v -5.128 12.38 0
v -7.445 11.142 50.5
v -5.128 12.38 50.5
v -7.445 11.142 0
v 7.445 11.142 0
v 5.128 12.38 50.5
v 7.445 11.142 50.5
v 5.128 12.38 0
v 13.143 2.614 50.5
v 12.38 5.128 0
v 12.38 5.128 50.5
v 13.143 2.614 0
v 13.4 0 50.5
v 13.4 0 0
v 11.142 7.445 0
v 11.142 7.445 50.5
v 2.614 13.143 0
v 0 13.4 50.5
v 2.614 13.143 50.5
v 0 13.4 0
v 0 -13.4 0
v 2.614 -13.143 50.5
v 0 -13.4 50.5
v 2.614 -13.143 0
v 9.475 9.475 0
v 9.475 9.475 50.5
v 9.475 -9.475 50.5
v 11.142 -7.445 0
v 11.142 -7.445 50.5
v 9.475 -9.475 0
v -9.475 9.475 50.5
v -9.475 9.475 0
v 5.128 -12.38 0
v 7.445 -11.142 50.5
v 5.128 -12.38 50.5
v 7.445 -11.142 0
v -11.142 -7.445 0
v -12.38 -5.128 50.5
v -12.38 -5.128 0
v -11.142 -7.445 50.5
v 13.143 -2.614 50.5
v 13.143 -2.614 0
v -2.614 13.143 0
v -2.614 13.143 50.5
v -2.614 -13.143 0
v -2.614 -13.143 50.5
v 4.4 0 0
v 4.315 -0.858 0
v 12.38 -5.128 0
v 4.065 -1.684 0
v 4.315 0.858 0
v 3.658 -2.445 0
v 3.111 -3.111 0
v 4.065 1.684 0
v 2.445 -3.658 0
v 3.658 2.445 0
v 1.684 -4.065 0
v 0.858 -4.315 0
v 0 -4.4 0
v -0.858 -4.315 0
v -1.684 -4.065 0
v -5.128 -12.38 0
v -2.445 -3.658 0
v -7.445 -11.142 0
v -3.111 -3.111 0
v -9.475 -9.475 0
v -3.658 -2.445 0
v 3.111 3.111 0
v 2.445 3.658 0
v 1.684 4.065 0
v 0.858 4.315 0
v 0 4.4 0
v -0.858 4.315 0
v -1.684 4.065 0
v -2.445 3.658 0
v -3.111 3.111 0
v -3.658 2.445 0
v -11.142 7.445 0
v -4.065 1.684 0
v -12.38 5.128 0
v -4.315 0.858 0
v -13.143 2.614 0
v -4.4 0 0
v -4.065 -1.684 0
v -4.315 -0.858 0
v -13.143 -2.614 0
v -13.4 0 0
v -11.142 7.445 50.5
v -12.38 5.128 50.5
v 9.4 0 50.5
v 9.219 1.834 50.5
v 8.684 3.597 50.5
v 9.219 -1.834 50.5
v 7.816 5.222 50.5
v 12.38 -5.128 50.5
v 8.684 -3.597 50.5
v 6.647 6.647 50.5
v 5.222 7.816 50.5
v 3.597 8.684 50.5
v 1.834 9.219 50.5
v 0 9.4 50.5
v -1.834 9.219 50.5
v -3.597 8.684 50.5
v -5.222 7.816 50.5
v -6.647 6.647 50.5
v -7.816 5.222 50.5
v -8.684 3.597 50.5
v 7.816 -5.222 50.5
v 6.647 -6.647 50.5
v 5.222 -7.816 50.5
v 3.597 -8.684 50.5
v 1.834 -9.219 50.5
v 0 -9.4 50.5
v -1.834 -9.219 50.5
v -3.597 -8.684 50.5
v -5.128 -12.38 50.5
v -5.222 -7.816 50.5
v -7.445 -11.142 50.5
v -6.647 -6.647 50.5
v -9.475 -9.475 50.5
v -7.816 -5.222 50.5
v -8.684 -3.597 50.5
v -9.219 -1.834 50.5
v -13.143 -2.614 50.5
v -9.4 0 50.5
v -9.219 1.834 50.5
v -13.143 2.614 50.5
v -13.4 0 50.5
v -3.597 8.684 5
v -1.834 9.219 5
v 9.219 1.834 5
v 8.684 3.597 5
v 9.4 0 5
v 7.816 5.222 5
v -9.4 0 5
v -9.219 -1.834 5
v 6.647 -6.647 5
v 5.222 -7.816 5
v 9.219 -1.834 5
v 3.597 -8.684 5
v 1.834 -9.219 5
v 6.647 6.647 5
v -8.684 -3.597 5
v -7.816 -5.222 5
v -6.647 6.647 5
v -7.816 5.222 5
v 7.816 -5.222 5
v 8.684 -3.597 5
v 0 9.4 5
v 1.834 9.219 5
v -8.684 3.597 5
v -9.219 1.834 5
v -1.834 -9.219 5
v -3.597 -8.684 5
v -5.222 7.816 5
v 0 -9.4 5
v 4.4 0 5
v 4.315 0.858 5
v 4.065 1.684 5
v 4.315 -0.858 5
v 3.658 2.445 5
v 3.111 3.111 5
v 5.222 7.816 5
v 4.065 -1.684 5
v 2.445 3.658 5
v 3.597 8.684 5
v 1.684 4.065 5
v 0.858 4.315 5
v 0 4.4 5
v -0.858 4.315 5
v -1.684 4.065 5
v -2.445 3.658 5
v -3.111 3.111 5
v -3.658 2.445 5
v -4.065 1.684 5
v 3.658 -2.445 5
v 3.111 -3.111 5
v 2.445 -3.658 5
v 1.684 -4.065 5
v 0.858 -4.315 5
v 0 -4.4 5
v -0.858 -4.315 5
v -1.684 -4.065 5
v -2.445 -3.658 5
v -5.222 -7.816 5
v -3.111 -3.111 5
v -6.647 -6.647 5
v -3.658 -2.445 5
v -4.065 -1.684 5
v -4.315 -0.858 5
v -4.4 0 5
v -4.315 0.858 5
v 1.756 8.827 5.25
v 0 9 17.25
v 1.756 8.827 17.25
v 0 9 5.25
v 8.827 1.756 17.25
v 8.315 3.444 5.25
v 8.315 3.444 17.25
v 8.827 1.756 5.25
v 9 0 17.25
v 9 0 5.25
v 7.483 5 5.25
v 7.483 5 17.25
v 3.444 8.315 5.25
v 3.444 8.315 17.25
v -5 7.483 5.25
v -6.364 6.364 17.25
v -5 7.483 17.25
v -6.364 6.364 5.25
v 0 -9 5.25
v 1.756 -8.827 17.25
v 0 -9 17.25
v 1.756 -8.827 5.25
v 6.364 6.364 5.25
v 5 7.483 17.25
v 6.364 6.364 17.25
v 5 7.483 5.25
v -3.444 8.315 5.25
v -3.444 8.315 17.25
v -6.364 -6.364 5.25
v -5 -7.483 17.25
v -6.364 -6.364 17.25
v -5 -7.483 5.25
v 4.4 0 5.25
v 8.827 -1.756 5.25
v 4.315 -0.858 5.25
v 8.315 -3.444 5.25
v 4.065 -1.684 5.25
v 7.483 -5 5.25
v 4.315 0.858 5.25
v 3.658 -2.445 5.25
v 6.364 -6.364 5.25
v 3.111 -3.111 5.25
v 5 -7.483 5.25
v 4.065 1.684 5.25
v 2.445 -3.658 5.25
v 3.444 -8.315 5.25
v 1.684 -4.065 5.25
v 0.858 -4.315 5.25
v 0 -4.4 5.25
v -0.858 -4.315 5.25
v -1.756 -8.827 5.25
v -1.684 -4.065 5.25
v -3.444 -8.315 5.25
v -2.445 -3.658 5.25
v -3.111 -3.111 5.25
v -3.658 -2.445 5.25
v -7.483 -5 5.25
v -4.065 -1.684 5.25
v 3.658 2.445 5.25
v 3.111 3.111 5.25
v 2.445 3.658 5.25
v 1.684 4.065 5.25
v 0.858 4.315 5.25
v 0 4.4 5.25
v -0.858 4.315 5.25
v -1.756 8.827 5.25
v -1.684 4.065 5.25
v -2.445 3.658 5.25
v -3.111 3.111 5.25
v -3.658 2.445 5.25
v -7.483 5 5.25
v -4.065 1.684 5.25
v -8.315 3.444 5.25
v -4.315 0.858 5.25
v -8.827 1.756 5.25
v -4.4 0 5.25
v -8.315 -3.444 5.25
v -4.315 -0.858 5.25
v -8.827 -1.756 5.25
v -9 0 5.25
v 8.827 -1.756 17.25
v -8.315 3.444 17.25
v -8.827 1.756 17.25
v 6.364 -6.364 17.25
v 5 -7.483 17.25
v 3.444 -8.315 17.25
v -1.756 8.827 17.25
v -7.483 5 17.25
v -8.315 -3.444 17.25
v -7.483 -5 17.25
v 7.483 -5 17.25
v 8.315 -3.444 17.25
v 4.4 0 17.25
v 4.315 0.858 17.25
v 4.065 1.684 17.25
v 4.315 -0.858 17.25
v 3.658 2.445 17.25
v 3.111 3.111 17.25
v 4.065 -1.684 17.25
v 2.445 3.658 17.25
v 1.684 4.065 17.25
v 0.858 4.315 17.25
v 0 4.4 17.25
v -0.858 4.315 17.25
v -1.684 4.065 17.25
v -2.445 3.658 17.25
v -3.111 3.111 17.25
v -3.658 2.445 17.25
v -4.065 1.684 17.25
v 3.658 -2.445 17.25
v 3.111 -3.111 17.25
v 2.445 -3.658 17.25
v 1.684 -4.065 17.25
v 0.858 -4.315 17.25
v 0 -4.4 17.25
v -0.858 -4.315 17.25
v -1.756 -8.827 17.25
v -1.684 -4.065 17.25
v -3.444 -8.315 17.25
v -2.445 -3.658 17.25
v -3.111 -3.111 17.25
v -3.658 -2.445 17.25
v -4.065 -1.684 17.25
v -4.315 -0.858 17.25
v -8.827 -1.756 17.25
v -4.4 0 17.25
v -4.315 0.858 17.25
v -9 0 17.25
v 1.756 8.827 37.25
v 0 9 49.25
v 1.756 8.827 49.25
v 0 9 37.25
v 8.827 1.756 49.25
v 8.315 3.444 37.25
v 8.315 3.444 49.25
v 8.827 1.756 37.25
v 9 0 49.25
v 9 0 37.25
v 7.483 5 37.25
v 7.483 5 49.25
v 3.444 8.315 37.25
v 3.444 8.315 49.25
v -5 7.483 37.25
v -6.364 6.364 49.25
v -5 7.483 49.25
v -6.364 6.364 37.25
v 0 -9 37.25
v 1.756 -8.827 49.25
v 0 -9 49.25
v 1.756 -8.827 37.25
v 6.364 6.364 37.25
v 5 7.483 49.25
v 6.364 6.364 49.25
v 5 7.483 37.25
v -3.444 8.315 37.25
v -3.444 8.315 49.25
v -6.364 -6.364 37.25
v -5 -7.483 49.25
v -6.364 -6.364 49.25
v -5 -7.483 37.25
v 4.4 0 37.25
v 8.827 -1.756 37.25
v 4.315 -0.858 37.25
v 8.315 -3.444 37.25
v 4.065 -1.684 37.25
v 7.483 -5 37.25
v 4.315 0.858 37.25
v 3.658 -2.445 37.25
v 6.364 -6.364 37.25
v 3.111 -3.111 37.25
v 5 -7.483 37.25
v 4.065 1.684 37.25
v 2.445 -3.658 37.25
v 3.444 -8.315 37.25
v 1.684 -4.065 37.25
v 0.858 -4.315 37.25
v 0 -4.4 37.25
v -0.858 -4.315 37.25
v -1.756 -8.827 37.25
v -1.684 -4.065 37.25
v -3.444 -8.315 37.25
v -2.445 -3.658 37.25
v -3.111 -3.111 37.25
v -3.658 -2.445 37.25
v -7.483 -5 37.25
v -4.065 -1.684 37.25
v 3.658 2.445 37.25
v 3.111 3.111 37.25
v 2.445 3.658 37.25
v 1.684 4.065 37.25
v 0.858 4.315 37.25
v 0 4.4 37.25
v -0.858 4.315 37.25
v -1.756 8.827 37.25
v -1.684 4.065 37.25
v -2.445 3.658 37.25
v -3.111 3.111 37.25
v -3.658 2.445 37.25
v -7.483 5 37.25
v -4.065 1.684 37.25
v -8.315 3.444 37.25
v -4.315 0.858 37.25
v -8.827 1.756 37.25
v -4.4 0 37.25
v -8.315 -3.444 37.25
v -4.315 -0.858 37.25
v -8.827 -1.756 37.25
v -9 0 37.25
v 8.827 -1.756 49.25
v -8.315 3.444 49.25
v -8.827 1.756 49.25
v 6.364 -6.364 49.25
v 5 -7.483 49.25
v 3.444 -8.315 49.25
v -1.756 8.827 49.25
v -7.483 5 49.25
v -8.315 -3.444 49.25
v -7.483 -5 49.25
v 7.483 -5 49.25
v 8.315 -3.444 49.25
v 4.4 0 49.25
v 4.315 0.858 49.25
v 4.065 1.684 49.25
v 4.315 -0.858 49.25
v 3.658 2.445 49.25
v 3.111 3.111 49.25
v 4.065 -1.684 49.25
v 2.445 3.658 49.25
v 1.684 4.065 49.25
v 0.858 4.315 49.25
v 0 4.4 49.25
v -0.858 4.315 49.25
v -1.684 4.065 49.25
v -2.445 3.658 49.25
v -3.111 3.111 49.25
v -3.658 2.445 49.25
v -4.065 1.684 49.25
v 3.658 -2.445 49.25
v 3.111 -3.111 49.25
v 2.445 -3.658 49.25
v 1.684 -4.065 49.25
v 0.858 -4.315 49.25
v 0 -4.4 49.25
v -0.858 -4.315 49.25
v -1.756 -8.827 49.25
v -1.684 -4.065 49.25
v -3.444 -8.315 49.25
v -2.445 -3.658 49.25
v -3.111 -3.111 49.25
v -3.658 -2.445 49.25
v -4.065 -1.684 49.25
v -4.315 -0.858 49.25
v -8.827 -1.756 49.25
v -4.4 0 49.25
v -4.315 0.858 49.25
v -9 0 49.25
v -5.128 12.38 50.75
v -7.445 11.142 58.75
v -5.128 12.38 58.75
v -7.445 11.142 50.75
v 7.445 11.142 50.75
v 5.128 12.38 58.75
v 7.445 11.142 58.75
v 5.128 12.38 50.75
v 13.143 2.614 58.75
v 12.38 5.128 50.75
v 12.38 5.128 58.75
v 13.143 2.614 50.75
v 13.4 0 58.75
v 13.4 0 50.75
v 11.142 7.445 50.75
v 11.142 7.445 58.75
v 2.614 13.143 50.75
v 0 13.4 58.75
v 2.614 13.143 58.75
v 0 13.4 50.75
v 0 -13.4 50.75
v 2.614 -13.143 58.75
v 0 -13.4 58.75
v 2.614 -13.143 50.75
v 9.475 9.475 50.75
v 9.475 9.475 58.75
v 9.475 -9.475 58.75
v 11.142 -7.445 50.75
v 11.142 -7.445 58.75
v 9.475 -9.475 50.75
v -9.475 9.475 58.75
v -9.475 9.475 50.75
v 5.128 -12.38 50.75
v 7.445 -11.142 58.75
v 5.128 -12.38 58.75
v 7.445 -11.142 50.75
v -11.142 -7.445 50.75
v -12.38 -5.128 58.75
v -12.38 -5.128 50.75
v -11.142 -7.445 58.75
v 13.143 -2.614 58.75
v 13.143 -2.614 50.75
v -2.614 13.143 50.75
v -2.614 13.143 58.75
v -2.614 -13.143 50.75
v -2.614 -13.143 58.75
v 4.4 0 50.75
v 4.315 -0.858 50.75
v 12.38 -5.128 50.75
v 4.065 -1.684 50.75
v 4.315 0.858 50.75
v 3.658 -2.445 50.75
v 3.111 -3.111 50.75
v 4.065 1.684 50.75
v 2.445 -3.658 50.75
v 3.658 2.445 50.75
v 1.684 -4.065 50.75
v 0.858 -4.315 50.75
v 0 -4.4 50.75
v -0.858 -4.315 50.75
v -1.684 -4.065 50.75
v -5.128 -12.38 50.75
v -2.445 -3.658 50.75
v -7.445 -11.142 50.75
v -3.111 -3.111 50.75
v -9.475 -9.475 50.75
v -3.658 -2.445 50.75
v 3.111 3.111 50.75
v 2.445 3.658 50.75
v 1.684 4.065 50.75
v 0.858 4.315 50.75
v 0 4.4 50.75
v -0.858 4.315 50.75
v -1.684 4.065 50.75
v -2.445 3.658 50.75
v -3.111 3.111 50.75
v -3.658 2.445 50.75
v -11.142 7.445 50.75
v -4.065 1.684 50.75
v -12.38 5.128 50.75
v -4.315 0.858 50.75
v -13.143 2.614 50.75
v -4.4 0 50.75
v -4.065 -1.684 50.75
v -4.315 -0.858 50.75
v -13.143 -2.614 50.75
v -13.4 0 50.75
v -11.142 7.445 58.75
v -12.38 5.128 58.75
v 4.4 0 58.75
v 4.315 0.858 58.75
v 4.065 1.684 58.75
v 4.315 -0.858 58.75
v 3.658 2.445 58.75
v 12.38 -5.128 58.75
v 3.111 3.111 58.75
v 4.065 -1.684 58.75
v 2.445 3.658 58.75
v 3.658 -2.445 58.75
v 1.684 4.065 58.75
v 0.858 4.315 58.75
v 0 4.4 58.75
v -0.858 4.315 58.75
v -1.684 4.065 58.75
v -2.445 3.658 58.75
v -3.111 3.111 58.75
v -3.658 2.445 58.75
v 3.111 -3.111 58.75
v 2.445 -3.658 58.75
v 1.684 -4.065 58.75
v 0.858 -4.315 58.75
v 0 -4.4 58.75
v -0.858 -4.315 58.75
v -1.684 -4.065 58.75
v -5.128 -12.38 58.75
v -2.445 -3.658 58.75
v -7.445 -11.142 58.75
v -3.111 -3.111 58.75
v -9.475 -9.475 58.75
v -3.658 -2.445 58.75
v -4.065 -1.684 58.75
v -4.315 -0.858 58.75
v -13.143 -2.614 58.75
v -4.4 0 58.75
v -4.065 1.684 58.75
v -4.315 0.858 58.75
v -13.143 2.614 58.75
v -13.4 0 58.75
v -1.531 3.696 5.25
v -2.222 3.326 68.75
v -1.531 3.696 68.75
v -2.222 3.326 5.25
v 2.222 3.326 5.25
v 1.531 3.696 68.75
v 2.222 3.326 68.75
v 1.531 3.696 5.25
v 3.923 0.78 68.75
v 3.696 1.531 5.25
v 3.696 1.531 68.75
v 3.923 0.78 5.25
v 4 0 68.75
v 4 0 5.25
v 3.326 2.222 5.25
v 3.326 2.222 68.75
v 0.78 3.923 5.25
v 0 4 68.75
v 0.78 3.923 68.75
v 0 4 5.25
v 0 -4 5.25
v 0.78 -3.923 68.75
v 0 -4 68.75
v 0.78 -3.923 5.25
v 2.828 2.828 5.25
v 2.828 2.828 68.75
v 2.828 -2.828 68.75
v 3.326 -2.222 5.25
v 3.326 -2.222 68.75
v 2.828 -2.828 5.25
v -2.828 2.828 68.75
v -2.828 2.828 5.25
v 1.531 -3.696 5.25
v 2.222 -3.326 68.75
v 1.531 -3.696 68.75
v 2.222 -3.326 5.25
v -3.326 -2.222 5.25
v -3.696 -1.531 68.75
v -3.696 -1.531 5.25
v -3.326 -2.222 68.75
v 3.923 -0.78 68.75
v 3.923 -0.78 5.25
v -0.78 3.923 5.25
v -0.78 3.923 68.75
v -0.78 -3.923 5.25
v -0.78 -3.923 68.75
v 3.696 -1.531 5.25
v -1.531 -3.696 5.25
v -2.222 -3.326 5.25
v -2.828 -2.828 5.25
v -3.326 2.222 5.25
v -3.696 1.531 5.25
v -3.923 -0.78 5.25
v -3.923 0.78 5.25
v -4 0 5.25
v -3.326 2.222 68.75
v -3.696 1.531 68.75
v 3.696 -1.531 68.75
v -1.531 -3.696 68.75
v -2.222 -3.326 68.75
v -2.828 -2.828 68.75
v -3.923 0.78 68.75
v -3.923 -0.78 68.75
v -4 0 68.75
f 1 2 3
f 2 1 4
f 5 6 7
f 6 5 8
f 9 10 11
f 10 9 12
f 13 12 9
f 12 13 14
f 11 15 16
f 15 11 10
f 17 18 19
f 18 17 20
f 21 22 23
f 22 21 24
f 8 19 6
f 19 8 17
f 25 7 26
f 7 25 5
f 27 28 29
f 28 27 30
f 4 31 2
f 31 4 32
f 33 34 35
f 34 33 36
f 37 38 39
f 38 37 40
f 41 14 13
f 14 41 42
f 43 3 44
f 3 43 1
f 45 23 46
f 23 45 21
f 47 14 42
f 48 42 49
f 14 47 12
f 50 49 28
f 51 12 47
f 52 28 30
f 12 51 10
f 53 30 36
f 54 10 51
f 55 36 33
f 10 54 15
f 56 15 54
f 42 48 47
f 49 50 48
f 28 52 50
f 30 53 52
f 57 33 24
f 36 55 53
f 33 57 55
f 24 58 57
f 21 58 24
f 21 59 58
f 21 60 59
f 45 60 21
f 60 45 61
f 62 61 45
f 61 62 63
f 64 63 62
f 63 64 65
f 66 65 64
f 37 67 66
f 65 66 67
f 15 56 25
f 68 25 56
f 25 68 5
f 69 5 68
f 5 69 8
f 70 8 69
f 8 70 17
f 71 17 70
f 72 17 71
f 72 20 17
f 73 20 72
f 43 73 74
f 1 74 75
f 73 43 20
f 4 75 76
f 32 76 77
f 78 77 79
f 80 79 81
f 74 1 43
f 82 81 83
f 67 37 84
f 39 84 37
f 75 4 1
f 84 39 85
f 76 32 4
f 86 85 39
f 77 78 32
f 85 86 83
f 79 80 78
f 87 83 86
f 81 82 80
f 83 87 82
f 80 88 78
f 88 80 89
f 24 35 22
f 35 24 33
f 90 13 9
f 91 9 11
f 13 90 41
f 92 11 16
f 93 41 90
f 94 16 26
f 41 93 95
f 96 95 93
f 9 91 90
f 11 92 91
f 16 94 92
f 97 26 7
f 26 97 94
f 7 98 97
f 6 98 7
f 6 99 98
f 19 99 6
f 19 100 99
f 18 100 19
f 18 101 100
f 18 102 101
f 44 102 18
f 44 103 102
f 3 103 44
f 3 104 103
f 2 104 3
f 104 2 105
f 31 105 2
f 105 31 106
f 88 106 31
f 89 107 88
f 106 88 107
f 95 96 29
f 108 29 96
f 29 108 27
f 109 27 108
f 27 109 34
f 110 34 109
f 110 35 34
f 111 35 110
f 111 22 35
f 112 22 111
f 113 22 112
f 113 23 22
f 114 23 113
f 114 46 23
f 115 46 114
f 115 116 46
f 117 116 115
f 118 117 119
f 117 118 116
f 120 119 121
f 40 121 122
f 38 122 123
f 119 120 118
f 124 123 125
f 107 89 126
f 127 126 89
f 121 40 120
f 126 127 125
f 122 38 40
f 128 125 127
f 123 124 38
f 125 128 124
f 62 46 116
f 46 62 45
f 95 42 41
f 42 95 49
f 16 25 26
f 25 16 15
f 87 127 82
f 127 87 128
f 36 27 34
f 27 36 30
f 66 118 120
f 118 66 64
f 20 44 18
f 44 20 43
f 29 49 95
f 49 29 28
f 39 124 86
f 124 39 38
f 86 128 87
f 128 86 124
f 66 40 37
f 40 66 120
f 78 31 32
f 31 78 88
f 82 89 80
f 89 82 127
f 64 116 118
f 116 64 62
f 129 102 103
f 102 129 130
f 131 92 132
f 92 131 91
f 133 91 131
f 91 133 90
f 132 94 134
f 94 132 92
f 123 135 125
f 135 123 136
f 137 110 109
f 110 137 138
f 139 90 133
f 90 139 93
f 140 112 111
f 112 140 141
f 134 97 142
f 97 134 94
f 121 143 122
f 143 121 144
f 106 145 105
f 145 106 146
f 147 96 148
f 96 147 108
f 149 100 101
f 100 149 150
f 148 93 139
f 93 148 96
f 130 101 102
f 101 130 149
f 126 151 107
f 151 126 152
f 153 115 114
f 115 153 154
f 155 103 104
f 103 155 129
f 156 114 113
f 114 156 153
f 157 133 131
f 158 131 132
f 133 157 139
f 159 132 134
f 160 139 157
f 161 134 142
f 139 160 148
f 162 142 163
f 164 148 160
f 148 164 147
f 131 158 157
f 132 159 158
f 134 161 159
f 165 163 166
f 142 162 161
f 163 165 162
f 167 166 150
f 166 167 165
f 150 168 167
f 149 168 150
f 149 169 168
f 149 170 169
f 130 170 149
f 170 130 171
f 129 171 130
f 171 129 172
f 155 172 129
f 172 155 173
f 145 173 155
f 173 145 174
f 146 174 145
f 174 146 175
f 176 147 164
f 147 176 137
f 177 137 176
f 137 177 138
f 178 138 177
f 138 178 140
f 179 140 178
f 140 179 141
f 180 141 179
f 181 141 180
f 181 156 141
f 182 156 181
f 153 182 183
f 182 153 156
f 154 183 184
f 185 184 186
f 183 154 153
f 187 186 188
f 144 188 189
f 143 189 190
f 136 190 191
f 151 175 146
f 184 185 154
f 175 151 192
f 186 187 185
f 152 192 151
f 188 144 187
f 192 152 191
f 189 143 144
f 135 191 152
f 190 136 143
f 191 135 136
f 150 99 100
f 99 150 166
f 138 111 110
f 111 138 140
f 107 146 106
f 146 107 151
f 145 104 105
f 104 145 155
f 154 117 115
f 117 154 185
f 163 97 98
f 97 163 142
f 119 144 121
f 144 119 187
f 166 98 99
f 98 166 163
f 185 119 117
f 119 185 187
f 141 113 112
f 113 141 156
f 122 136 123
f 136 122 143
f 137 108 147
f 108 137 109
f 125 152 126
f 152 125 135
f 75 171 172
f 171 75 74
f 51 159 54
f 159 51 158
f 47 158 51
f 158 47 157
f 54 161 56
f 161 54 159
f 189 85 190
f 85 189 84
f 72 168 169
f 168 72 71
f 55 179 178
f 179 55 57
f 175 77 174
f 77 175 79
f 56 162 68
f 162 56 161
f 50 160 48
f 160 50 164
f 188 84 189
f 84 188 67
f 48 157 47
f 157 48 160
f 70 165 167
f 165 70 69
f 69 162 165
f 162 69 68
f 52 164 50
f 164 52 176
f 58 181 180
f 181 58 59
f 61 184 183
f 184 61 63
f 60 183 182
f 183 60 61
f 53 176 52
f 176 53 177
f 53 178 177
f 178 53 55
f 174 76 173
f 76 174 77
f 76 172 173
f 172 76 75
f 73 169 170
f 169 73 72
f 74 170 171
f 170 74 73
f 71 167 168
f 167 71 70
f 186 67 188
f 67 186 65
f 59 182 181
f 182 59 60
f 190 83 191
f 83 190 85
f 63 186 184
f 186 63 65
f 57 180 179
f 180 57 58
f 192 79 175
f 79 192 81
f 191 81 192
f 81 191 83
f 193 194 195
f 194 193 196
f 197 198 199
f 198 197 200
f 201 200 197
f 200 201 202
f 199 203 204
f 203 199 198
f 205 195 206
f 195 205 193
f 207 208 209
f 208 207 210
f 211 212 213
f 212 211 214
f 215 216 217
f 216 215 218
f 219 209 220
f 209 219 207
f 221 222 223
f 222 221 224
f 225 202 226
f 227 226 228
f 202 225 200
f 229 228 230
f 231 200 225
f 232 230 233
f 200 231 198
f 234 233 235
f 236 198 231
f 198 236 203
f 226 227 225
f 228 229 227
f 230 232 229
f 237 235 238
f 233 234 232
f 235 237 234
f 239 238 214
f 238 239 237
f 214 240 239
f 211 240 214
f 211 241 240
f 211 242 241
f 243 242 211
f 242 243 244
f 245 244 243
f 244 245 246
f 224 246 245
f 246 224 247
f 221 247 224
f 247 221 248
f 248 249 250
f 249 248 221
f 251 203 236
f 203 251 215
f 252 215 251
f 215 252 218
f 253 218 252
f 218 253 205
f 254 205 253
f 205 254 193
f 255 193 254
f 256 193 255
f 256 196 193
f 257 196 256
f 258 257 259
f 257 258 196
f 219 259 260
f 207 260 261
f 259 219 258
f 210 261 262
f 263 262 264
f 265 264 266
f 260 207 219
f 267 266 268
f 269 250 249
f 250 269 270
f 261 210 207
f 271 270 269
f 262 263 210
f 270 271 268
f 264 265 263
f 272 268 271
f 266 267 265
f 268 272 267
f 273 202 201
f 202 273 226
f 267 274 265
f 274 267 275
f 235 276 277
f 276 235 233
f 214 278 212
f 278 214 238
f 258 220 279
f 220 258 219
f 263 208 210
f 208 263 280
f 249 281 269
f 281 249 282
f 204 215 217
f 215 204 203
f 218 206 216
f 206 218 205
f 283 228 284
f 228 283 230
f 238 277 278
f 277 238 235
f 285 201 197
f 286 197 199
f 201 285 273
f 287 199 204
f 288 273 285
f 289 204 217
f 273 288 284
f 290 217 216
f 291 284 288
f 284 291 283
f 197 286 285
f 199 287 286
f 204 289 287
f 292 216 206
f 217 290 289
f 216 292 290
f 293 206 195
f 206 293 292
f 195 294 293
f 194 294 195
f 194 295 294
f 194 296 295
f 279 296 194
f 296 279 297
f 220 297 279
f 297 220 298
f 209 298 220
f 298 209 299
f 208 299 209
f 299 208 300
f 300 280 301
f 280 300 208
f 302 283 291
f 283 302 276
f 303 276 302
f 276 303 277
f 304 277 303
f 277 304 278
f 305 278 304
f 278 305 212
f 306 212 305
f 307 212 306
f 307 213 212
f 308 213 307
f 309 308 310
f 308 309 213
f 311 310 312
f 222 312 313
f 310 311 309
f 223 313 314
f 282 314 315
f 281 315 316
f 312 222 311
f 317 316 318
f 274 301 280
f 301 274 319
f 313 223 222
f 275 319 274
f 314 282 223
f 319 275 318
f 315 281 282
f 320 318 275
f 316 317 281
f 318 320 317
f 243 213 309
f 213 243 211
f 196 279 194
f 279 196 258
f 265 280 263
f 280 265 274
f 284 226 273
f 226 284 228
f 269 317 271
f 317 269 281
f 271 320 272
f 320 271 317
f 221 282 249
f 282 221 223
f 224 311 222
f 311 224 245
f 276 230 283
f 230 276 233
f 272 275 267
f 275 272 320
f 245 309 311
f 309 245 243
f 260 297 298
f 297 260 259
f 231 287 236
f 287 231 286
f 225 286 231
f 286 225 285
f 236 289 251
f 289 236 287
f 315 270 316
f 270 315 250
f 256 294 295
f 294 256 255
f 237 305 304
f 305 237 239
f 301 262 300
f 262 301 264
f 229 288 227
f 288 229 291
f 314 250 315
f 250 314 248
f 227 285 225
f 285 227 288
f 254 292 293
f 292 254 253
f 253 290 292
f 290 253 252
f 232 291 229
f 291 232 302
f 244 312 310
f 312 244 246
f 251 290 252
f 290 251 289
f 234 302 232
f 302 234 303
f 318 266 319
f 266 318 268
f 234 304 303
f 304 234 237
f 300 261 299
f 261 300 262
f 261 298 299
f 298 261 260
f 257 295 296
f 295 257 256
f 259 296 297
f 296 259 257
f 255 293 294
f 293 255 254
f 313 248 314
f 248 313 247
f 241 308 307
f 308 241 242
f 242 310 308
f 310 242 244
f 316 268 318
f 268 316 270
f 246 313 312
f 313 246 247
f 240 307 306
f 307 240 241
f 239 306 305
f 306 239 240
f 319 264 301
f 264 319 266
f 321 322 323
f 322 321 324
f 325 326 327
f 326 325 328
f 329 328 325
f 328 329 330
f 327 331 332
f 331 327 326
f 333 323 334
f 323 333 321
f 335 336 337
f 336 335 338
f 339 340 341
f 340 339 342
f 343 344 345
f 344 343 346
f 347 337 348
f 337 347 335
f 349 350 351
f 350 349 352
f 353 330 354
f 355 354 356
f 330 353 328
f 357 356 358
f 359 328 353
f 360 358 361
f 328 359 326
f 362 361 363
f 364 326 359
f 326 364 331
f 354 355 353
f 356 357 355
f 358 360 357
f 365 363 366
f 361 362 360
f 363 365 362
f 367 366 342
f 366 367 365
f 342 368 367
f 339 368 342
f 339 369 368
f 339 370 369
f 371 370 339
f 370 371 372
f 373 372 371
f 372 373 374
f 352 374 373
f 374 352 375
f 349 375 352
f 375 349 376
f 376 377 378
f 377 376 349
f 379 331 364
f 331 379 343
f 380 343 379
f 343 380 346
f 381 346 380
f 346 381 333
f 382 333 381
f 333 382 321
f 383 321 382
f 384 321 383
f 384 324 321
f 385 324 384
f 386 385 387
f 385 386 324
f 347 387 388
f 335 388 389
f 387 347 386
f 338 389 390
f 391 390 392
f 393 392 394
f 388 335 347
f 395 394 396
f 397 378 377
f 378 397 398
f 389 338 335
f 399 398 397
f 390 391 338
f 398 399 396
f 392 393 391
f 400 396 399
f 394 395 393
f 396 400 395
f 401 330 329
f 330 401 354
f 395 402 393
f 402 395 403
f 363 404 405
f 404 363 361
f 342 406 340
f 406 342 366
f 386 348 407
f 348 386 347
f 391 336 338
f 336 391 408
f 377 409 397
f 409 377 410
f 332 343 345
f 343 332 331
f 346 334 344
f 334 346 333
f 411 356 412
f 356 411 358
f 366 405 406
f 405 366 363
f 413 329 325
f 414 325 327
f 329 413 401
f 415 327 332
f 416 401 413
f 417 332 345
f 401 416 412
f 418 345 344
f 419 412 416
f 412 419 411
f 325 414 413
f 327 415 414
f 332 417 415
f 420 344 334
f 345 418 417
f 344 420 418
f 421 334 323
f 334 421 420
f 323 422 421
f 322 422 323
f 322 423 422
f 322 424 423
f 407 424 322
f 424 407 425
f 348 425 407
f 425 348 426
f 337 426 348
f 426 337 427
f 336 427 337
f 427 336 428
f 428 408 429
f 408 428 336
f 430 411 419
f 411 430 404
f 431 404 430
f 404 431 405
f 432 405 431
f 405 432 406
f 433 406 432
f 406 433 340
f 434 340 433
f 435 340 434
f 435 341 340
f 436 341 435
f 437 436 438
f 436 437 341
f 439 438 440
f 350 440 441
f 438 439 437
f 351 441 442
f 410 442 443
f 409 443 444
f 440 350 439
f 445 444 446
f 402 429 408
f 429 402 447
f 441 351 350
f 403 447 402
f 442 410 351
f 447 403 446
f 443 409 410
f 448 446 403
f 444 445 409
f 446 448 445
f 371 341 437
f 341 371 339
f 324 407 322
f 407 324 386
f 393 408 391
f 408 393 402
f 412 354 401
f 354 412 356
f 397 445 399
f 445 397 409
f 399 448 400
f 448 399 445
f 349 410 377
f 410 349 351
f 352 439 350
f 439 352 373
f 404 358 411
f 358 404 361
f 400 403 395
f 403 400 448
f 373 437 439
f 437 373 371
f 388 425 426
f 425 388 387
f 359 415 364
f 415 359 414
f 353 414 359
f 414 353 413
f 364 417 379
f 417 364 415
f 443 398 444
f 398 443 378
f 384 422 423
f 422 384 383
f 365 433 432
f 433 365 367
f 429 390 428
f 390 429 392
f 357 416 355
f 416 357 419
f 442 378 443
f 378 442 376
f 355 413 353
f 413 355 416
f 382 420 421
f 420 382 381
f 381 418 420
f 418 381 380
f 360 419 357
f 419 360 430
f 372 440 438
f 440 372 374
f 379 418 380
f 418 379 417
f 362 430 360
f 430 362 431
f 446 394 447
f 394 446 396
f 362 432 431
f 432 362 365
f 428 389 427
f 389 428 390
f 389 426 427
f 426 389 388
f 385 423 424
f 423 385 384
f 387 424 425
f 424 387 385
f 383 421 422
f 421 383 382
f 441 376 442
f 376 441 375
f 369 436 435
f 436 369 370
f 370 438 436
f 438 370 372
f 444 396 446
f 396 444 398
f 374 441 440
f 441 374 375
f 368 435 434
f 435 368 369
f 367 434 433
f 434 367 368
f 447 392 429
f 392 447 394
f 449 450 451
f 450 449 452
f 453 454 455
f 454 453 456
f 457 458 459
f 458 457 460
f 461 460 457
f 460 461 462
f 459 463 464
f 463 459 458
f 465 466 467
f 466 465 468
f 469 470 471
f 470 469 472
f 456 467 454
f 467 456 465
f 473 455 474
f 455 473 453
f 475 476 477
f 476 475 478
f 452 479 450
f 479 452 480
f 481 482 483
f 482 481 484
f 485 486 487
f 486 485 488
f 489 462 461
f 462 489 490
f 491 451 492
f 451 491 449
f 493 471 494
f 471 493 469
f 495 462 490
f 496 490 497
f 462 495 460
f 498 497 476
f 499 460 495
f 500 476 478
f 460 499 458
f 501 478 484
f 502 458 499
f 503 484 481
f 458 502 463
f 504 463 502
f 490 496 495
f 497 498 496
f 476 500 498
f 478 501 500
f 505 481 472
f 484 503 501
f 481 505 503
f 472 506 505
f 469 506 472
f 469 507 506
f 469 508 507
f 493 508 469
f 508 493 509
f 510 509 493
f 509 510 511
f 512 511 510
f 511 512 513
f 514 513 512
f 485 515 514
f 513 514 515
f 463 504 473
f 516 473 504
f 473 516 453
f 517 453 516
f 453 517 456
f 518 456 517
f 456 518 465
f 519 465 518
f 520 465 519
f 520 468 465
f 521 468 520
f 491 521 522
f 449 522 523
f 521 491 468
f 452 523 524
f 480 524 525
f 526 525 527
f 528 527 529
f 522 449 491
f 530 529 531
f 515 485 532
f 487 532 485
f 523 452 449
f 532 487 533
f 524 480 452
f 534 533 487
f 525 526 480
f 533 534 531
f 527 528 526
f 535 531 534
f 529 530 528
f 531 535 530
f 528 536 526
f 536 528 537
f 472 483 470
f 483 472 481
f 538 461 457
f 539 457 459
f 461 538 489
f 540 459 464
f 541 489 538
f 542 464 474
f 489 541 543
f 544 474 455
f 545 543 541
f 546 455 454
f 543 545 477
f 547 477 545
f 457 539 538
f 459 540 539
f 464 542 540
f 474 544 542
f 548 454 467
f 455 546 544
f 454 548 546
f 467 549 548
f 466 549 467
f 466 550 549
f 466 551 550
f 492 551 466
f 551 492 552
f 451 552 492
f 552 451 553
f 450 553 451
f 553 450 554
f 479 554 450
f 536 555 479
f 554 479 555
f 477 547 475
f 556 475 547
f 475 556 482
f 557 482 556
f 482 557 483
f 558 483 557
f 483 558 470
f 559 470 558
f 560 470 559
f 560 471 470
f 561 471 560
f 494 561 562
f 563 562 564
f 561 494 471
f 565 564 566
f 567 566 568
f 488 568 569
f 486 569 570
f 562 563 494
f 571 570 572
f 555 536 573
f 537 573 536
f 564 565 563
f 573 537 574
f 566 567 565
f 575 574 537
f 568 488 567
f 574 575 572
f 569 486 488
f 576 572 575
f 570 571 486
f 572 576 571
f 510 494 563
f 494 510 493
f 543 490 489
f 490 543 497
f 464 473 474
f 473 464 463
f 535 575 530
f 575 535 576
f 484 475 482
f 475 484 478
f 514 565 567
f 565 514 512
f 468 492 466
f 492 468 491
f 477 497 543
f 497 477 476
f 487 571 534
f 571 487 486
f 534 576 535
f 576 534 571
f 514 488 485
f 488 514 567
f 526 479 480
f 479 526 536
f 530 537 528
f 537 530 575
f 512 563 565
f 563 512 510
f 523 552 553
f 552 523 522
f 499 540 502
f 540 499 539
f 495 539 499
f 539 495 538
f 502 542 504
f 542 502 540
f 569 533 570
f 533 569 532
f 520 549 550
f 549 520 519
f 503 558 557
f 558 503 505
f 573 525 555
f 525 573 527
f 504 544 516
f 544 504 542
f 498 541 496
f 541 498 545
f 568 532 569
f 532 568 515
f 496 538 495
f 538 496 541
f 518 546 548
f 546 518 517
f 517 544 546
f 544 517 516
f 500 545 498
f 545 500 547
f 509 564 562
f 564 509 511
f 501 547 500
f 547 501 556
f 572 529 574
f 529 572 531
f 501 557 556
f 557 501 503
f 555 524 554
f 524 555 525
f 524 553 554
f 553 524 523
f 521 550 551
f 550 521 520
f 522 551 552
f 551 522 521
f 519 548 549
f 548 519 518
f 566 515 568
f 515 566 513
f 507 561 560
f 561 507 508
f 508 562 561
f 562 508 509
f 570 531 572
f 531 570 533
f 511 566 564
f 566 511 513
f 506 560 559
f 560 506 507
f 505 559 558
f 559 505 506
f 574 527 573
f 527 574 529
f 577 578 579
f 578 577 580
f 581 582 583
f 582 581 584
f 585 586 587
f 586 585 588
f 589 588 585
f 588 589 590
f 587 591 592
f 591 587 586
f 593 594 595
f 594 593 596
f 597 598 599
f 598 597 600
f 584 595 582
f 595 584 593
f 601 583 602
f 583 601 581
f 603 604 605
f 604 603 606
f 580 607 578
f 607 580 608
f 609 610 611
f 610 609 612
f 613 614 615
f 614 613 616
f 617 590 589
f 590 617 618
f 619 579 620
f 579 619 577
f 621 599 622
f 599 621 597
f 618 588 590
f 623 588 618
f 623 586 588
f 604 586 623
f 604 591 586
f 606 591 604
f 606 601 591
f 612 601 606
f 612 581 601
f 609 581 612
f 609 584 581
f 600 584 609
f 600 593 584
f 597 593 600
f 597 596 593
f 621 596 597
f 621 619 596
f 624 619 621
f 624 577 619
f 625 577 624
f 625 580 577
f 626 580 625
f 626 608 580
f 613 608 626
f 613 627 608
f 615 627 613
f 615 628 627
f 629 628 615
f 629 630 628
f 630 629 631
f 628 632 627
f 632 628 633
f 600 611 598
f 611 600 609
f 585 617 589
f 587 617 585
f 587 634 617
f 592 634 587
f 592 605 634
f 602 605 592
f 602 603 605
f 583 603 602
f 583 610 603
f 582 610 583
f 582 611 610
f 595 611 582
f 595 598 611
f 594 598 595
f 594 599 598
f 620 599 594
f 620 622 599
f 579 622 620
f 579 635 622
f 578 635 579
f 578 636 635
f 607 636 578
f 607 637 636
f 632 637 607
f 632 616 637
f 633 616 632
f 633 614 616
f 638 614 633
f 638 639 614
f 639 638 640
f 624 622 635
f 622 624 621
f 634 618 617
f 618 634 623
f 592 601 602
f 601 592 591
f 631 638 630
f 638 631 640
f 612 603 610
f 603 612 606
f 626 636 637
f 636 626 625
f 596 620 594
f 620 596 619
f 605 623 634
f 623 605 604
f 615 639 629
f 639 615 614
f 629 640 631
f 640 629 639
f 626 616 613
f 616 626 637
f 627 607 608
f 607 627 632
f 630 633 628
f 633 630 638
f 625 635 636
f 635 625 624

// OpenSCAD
$fn = 32;

// ------------------------------------------------------------------------
// Shaft station: cup d26.8 x 50.5 mm, shaft d8
// Every part is its own module, assembly() places every instance.
// ------------------------------------------------------------------------

// --- part 1 ---
module housing_cup() {
  difference() {
    cylinder(h = 50.5, d = 26.8);
    translate([0, 0, 5]) cylinder(h = 46.5, d = 18.8);
    translate([0, 0, -1]) cylinder(h = 7, d = 8.8);
  }
}

// --- part 2 ---
module bearing_lower() {
  difference() {
      translate([0, 0, 0]) cylinder(h = 12, d = 18);
      translate([0, 0, -1]) cylinder(h = 14, d = 8.8);
    }
}

// --- part 3 ---
module bearing_upper() {
  difference() {
      translate([0, 0, 0]) cylinder(h = 12, d = 18);
      translate([0, 0, -1]) cylinder(h = 14, d = 8.8);
    }
}

// --- part 4 ---
module station_shaft() {
  translate([0, 0, -31.75]) cylinder(h = 63.5, d = 8);
}

// --- part 5 ---
module station_cover() {
  difference() {
    cylinder(h = 8, d = 26.8);
    translate([0, 0, -1]) cylinder(h = 10, d = 8.8);
  }
}

// --- assembly ---
module assembly() {
  color([0.80, 0.24, 0.20]) translate([0, 0, 0]) rotate([0, 0, 0]) housing_cup();
  color([0.20, 0.45, 0.75]) translate([0, 0, 5.25]) rotate([0, 0, 0]) bearing_lower();
  color([0.25, 0.62, 0.32]) translate([0, 0, 37.25]) rotate([0, 0, 0]) bearing_upper();
  color([0.92, 0.70, 0.18]) translate([0, 0, 37]) rotate([0, 0, 0]) station_shaft();
  color([0.58, 0.35, 0.70]) translate([0, 0, 50.75]) rotate([0, 0, 0]) station_cover();
}

assembly();
